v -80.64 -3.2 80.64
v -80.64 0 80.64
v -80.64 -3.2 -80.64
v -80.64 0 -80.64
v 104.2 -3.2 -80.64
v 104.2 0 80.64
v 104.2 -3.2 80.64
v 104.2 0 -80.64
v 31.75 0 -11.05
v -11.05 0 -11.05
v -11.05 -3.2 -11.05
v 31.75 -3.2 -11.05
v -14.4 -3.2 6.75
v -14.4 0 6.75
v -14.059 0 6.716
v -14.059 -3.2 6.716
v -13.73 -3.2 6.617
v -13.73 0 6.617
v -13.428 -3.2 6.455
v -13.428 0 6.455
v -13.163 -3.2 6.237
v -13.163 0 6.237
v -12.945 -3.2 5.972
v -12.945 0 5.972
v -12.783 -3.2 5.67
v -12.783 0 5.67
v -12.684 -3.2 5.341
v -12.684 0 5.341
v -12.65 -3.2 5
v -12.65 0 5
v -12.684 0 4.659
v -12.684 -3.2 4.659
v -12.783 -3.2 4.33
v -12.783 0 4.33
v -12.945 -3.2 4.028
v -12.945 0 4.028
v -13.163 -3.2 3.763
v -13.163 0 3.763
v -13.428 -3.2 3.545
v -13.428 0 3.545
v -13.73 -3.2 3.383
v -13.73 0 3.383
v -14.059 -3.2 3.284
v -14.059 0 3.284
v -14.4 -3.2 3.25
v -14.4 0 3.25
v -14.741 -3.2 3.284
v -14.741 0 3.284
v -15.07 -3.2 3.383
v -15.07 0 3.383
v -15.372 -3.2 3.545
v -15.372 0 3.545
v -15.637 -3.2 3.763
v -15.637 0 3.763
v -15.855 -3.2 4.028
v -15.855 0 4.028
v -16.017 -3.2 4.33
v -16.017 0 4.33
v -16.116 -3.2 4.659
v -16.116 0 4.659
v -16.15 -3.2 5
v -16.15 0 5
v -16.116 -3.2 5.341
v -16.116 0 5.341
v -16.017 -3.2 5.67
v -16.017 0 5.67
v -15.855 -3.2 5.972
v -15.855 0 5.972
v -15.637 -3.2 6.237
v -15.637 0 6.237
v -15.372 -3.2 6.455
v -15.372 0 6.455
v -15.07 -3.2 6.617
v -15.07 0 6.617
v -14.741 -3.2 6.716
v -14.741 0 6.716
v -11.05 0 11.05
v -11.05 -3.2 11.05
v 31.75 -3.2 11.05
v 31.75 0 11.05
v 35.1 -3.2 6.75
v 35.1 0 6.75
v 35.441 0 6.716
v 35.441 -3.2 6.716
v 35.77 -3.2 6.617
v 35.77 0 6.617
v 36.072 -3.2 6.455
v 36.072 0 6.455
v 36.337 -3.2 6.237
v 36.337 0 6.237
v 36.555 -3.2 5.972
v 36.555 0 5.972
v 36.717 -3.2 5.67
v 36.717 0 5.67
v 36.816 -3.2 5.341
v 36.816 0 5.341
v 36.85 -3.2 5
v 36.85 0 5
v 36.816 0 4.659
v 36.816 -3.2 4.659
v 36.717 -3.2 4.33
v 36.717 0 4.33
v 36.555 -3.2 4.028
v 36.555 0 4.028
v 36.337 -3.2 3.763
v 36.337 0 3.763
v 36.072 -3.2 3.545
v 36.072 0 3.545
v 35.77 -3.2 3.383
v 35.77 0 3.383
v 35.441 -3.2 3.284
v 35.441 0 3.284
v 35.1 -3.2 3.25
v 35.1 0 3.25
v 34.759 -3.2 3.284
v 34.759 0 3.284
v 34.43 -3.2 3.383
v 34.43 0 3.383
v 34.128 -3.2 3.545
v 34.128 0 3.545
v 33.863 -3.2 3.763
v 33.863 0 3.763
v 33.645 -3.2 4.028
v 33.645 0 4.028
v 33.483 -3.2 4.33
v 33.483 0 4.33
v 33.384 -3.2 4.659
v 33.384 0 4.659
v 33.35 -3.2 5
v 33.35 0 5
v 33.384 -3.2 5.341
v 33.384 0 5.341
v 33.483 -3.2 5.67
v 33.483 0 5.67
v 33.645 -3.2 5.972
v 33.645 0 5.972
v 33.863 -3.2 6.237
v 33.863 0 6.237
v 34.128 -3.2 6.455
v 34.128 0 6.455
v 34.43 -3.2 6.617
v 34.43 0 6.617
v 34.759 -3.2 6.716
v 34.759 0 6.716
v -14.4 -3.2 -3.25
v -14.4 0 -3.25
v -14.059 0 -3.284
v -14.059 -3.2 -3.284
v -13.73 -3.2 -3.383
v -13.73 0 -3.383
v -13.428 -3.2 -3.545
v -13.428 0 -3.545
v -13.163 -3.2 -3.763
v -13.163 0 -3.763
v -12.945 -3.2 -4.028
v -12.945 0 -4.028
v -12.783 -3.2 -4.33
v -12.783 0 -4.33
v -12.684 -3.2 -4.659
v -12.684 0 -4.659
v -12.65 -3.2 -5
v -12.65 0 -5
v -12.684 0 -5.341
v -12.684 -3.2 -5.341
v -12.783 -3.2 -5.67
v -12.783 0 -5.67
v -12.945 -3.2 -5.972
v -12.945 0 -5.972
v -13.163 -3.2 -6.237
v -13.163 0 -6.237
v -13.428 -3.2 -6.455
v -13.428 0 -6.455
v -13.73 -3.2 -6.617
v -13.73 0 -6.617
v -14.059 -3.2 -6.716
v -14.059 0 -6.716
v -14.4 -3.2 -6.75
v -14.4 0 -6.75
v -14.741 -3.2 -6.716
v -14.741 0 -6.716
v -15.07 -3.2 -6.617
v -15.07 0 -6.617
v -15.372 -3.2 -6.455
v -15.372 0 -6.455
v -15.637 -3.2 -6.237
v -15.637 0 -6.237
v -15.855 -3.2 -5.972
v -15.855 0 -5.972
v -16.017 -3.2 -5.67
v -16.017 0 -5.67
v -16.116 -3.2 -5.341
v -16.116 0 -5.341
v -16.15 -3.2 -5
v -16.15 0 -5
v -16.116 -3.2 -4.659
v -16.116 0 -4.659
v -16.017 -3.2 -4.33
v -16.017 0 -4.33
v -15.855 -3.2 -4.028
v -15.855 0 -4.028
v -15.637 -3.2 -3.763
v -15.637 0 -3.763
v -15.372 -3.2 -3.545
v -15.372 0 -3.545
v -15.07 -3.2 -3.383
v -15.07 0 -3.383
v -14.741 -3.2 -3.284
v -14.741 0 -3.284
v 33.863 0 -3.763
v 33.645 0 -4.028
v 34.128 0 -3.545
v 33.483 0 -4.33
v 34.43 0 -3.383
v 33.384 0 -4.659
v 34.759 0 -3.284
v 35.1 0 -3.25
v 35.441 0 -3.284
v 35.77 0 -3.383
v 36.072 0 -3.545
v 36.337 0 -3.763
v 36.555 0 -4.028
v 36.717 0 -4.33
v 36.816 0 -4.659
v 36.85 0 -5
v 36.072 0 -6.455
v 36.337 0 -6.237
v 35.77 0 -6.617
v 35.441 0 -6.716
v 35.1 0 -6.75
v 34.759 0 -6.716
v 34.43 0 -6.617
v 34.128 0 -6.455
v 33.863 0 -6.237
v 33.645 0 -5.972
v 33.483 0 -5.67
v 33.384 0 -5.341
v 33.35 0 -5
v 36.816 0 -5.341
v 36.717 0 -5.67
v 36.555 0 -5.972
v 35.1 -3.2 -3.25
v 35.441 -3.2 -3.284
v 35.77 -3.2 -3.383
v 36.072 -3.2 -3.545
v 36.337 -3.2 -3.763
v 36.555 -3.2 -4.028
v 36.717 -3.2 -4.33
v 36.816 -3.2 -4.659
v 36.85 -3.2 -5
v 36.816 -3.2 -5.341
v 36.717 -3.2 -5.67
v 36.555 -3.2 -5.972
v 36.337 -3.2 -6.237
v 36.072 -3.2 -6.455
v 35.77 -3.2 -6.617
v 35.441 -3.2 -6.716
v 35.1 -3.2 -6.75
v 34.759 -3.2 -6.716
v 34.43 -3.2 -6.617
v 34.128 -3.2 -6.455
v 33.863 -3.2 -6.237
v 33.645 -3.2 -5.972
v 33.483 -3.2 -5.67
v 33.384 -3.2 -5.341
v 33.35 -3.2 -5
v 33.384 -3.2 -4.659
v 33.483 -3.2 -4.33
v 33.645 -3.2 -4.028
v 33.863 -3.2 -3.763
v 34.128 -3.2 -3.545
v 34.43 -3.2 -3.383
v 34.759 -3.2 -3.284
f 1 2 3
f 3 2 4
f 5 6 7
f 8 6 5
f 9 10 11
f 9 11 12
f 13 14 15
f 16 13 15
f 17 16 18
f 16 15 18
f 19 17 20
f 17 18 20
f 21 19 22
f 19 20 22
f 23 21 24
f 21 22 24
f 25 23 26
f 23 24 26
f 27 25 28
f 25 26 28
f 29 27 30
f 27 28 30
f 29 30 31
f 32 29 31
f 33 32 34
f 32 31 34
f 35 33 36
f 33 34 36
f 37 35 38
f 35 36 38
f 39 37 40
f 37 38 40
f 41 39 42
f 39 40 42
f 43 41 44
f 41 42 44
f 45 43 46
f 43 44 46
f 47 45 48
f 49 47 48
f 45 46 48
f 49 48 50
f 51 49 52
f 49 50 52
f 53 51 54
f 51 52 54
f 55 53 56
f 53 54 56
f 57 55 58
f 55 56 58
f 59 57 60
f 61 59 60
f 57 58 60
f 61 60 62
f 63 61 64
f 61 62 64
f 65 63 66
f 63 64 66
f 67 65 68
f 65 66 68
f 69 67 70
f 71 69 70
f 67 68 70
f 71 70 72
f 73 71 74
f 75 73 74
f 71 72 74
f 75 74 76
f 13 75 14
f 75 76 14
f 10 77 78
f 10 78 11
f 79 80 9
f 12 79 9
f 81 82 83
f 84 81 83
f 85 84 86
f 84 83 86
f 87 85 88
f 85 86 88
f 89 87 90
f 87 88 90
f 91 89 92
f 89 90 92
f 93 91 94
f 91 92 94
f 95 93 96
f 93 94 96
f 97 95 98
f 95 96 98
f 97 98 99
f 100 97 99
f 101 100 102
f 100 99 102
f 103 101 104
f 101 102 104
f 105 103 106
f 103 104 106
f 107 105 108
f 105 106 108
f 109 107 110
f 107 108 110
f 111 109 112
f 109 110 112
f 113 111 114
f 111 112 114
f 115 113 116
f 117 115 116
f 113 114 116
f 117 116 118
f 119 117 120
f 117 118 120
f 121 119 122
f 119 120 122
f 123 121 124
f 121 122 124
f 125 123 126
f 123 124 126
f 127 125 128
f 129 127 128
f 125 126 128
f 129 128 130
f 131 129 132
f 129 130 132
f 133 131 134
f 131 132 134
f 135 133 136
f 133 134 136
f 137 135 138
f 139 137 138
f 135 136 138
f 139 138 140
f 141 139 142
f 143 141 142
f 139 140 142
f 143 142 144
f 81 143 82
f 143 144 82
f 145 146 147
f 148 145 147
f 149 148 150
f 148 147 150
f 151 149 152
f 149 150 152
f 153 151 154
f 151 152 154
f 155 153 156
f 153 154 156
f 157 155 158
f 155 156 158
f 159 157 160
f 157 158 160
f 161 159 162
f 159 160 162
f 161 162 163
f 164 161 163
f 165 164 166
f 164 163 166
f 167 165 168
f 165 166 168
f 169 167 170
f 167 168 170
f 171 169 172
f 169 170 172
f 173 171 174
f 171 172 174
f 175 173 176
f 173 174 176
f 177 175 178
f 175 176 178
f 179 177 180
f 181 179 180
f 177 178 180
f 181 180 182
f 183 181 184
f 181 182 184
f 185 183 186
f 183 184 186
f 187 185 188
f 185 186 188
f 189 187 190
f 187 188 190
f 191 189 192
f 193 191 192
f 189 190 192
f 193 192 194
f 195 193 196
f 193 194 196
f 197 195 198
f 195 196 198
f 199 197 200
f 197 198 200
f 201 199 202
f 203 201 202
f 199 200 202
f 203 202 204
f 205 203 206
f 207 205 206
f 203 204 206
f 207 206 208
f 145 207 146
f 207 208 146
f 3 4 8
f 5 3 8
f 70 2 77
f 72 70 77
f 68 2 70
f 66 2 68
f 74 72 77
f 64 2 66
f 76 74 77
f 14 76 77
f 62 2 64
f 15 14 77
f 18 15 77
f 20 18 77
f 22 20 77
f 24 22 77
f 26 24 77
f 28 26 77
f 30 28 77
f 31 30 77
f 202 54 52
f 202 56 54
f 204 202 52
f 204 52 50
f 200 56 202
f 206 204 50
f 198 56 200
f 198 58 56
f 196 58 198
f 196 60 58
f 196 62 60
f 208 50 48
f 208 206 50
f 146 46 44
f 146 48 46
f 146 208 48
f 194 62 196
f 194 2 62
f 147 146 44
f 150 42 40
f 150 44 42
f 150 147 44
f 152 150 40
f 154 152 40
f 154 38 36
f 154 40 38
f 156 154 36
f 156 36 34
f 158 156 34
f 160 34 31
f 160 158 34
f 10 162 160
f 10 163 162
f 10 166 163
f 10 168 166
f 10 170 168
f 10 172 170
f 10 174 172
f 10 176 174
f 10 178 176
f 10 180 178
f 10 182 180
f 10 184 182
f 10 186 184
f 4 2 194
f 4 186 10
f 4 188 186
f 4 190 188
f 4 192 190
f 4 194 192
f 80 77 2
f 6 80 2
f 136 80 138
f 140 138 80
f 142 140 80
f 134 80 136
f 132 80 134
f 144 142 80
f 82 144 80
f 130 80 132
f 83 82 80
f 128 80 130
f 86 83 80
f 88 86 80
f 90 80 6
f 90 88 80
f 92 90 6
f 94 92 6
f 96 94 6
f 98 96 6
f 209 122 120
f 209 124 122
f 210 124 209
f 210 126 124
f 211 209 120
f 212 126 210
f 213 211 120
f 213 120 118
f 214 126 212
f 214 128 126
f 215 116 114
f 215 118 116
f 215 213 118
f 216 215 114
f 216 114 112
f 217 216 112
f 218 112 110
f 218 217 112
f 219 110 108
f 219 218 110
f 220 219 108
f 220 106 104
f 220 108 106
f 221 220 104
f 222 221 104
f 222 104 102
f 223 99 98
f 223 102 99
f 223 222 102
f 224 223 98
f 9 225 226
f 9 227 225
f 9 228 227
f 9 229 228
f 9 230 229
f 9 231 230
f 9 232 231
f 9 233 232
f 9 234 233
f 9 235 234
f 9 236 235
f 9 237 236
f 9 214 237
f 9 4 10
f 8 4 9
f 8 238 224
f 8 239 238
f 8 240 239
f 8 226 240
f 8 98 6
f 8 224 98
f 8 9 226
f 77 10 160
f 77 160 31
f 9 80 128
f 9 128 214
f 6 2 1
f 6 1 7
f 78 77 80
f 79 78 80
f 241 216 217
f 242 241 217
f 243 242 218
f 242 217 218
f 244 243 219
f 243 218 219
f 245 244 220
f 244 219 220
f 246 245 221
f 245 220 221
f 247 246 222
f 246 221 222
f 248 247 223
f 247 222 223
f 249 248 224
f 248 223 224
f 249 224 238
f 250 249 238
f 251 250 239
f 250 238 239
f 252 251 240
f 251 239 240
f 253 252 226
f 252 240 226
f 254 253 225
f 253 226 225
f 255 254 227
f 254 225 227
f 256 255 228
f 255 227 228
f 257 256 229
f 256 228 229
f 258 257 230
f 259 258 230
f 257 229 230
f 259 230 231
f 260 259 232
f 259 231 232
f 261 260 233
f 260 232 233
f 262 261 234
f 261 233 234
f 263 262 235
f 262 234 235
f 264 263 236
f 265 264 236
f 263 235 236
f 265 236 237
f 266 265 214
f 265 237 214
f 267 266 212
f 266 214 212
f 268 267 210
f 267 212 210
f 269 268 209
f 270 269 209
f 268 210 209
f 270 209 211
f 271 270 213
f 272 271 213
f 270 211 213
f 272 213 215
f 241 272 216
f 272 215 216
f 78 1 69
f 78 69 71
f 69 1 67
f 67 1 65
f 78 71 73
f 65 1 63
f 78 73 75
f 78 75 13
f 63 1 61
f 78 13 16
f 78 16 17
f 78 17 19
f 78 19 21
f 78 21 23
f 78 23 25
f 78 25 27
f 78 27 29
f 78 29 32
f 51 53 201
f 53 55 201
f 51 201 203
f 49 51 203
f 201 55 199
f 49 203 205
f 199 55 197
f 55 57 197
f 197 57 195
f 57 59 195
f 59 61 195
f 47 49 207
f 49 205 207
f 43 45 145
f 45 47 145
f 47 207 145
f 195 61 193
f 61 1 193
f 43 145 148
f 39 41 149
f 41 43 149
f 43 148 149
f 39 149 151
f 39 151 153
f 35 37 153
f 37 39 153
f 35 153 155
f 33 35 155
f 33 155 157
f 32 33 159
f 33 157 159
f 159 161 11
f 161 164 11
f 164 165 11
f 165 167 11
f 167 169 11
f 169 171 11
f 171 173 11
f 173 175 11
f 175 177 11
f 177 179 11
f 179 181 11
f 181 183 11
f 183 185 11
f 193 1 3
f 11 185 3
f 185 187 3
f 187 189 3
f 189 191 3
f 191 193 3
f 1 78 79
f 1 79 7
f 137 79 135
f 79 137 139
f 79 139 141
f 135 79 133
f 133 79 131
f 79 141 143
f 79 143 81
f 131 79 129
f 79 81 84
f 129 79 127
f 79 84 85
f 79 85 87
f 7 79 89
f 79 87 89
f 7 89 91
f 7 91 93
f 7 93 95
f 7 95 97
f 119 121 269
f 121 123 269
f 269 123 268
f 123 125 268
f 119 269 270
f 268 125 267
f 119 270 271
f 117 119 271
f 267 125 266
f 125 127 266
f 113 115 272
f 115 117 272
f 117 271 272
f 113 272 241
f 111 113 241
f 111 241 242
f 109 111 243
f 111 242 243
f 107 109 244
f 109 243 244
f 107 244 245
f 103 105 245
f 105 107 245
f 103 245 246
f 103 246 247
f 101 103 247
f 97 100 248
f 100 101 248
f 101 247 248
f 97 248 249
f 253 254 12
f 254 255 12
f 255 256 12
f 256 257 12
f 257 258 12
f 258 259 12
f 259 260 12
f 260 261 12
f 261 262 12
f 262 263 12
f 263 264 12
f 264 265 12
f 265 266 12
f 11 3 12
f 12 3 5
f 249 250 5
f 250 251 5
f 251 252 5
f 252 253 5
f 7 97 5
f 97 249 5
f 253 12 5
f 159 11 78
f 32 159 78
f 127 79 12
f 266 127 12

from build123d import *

# Parameters (mm, degrees)
SKETCH1_W           = 184.839561026
SKETCH1_H           = 161.279122052
SKETCH1_R           = 1.75
SKETCH1_W_2         = 42.8
SKETCH1_H_2         = 22.1
BOSS_EXTRUDE1_DEPTH = 3.2


with BuildPart() as part:
    # Sketch1 → Boss-Extrude1 (new body)
    with BuildSketch(Plane(origin=(0, 0, 0), x_dir=(1, 0, 0), z_dir=(0, 1, 0))):
        with Locations((11.780219487, 0)):
            Rectangle(SKETCH1_W, SKETCH1_H)
        with Locations(Location((-14.4, 5, 0), (0, 0, 270))):
            Circle(SKETCH1_R, mode=Mode.SUBTRACT)
        with Locations(Location((-14.4, -5, 0), (0, 0, 270))):
            Circle(SKETCH1_R, mode=Mode.SUBTRACT)
        with Locations(Location((35.1, -5, 0), (0, 0, 270))):
            Circle(SKETCH1_R, mode=Mode.SUBTRACT)
        with Locations(Location((35.1, 5, 0), (0, 0, 270))):
            Circle(SKETCH1_R, mode=Mode.SUBTRACT)
        with Locations((10.35, 0)):
            Rectangle(SKETCH1_W_2, SKETCH1_H_2, mode=Mode.SUBTRACT)
    extrude(amount=-BOSS_EXTRUDE1_DEPTH)


solid = part.part
